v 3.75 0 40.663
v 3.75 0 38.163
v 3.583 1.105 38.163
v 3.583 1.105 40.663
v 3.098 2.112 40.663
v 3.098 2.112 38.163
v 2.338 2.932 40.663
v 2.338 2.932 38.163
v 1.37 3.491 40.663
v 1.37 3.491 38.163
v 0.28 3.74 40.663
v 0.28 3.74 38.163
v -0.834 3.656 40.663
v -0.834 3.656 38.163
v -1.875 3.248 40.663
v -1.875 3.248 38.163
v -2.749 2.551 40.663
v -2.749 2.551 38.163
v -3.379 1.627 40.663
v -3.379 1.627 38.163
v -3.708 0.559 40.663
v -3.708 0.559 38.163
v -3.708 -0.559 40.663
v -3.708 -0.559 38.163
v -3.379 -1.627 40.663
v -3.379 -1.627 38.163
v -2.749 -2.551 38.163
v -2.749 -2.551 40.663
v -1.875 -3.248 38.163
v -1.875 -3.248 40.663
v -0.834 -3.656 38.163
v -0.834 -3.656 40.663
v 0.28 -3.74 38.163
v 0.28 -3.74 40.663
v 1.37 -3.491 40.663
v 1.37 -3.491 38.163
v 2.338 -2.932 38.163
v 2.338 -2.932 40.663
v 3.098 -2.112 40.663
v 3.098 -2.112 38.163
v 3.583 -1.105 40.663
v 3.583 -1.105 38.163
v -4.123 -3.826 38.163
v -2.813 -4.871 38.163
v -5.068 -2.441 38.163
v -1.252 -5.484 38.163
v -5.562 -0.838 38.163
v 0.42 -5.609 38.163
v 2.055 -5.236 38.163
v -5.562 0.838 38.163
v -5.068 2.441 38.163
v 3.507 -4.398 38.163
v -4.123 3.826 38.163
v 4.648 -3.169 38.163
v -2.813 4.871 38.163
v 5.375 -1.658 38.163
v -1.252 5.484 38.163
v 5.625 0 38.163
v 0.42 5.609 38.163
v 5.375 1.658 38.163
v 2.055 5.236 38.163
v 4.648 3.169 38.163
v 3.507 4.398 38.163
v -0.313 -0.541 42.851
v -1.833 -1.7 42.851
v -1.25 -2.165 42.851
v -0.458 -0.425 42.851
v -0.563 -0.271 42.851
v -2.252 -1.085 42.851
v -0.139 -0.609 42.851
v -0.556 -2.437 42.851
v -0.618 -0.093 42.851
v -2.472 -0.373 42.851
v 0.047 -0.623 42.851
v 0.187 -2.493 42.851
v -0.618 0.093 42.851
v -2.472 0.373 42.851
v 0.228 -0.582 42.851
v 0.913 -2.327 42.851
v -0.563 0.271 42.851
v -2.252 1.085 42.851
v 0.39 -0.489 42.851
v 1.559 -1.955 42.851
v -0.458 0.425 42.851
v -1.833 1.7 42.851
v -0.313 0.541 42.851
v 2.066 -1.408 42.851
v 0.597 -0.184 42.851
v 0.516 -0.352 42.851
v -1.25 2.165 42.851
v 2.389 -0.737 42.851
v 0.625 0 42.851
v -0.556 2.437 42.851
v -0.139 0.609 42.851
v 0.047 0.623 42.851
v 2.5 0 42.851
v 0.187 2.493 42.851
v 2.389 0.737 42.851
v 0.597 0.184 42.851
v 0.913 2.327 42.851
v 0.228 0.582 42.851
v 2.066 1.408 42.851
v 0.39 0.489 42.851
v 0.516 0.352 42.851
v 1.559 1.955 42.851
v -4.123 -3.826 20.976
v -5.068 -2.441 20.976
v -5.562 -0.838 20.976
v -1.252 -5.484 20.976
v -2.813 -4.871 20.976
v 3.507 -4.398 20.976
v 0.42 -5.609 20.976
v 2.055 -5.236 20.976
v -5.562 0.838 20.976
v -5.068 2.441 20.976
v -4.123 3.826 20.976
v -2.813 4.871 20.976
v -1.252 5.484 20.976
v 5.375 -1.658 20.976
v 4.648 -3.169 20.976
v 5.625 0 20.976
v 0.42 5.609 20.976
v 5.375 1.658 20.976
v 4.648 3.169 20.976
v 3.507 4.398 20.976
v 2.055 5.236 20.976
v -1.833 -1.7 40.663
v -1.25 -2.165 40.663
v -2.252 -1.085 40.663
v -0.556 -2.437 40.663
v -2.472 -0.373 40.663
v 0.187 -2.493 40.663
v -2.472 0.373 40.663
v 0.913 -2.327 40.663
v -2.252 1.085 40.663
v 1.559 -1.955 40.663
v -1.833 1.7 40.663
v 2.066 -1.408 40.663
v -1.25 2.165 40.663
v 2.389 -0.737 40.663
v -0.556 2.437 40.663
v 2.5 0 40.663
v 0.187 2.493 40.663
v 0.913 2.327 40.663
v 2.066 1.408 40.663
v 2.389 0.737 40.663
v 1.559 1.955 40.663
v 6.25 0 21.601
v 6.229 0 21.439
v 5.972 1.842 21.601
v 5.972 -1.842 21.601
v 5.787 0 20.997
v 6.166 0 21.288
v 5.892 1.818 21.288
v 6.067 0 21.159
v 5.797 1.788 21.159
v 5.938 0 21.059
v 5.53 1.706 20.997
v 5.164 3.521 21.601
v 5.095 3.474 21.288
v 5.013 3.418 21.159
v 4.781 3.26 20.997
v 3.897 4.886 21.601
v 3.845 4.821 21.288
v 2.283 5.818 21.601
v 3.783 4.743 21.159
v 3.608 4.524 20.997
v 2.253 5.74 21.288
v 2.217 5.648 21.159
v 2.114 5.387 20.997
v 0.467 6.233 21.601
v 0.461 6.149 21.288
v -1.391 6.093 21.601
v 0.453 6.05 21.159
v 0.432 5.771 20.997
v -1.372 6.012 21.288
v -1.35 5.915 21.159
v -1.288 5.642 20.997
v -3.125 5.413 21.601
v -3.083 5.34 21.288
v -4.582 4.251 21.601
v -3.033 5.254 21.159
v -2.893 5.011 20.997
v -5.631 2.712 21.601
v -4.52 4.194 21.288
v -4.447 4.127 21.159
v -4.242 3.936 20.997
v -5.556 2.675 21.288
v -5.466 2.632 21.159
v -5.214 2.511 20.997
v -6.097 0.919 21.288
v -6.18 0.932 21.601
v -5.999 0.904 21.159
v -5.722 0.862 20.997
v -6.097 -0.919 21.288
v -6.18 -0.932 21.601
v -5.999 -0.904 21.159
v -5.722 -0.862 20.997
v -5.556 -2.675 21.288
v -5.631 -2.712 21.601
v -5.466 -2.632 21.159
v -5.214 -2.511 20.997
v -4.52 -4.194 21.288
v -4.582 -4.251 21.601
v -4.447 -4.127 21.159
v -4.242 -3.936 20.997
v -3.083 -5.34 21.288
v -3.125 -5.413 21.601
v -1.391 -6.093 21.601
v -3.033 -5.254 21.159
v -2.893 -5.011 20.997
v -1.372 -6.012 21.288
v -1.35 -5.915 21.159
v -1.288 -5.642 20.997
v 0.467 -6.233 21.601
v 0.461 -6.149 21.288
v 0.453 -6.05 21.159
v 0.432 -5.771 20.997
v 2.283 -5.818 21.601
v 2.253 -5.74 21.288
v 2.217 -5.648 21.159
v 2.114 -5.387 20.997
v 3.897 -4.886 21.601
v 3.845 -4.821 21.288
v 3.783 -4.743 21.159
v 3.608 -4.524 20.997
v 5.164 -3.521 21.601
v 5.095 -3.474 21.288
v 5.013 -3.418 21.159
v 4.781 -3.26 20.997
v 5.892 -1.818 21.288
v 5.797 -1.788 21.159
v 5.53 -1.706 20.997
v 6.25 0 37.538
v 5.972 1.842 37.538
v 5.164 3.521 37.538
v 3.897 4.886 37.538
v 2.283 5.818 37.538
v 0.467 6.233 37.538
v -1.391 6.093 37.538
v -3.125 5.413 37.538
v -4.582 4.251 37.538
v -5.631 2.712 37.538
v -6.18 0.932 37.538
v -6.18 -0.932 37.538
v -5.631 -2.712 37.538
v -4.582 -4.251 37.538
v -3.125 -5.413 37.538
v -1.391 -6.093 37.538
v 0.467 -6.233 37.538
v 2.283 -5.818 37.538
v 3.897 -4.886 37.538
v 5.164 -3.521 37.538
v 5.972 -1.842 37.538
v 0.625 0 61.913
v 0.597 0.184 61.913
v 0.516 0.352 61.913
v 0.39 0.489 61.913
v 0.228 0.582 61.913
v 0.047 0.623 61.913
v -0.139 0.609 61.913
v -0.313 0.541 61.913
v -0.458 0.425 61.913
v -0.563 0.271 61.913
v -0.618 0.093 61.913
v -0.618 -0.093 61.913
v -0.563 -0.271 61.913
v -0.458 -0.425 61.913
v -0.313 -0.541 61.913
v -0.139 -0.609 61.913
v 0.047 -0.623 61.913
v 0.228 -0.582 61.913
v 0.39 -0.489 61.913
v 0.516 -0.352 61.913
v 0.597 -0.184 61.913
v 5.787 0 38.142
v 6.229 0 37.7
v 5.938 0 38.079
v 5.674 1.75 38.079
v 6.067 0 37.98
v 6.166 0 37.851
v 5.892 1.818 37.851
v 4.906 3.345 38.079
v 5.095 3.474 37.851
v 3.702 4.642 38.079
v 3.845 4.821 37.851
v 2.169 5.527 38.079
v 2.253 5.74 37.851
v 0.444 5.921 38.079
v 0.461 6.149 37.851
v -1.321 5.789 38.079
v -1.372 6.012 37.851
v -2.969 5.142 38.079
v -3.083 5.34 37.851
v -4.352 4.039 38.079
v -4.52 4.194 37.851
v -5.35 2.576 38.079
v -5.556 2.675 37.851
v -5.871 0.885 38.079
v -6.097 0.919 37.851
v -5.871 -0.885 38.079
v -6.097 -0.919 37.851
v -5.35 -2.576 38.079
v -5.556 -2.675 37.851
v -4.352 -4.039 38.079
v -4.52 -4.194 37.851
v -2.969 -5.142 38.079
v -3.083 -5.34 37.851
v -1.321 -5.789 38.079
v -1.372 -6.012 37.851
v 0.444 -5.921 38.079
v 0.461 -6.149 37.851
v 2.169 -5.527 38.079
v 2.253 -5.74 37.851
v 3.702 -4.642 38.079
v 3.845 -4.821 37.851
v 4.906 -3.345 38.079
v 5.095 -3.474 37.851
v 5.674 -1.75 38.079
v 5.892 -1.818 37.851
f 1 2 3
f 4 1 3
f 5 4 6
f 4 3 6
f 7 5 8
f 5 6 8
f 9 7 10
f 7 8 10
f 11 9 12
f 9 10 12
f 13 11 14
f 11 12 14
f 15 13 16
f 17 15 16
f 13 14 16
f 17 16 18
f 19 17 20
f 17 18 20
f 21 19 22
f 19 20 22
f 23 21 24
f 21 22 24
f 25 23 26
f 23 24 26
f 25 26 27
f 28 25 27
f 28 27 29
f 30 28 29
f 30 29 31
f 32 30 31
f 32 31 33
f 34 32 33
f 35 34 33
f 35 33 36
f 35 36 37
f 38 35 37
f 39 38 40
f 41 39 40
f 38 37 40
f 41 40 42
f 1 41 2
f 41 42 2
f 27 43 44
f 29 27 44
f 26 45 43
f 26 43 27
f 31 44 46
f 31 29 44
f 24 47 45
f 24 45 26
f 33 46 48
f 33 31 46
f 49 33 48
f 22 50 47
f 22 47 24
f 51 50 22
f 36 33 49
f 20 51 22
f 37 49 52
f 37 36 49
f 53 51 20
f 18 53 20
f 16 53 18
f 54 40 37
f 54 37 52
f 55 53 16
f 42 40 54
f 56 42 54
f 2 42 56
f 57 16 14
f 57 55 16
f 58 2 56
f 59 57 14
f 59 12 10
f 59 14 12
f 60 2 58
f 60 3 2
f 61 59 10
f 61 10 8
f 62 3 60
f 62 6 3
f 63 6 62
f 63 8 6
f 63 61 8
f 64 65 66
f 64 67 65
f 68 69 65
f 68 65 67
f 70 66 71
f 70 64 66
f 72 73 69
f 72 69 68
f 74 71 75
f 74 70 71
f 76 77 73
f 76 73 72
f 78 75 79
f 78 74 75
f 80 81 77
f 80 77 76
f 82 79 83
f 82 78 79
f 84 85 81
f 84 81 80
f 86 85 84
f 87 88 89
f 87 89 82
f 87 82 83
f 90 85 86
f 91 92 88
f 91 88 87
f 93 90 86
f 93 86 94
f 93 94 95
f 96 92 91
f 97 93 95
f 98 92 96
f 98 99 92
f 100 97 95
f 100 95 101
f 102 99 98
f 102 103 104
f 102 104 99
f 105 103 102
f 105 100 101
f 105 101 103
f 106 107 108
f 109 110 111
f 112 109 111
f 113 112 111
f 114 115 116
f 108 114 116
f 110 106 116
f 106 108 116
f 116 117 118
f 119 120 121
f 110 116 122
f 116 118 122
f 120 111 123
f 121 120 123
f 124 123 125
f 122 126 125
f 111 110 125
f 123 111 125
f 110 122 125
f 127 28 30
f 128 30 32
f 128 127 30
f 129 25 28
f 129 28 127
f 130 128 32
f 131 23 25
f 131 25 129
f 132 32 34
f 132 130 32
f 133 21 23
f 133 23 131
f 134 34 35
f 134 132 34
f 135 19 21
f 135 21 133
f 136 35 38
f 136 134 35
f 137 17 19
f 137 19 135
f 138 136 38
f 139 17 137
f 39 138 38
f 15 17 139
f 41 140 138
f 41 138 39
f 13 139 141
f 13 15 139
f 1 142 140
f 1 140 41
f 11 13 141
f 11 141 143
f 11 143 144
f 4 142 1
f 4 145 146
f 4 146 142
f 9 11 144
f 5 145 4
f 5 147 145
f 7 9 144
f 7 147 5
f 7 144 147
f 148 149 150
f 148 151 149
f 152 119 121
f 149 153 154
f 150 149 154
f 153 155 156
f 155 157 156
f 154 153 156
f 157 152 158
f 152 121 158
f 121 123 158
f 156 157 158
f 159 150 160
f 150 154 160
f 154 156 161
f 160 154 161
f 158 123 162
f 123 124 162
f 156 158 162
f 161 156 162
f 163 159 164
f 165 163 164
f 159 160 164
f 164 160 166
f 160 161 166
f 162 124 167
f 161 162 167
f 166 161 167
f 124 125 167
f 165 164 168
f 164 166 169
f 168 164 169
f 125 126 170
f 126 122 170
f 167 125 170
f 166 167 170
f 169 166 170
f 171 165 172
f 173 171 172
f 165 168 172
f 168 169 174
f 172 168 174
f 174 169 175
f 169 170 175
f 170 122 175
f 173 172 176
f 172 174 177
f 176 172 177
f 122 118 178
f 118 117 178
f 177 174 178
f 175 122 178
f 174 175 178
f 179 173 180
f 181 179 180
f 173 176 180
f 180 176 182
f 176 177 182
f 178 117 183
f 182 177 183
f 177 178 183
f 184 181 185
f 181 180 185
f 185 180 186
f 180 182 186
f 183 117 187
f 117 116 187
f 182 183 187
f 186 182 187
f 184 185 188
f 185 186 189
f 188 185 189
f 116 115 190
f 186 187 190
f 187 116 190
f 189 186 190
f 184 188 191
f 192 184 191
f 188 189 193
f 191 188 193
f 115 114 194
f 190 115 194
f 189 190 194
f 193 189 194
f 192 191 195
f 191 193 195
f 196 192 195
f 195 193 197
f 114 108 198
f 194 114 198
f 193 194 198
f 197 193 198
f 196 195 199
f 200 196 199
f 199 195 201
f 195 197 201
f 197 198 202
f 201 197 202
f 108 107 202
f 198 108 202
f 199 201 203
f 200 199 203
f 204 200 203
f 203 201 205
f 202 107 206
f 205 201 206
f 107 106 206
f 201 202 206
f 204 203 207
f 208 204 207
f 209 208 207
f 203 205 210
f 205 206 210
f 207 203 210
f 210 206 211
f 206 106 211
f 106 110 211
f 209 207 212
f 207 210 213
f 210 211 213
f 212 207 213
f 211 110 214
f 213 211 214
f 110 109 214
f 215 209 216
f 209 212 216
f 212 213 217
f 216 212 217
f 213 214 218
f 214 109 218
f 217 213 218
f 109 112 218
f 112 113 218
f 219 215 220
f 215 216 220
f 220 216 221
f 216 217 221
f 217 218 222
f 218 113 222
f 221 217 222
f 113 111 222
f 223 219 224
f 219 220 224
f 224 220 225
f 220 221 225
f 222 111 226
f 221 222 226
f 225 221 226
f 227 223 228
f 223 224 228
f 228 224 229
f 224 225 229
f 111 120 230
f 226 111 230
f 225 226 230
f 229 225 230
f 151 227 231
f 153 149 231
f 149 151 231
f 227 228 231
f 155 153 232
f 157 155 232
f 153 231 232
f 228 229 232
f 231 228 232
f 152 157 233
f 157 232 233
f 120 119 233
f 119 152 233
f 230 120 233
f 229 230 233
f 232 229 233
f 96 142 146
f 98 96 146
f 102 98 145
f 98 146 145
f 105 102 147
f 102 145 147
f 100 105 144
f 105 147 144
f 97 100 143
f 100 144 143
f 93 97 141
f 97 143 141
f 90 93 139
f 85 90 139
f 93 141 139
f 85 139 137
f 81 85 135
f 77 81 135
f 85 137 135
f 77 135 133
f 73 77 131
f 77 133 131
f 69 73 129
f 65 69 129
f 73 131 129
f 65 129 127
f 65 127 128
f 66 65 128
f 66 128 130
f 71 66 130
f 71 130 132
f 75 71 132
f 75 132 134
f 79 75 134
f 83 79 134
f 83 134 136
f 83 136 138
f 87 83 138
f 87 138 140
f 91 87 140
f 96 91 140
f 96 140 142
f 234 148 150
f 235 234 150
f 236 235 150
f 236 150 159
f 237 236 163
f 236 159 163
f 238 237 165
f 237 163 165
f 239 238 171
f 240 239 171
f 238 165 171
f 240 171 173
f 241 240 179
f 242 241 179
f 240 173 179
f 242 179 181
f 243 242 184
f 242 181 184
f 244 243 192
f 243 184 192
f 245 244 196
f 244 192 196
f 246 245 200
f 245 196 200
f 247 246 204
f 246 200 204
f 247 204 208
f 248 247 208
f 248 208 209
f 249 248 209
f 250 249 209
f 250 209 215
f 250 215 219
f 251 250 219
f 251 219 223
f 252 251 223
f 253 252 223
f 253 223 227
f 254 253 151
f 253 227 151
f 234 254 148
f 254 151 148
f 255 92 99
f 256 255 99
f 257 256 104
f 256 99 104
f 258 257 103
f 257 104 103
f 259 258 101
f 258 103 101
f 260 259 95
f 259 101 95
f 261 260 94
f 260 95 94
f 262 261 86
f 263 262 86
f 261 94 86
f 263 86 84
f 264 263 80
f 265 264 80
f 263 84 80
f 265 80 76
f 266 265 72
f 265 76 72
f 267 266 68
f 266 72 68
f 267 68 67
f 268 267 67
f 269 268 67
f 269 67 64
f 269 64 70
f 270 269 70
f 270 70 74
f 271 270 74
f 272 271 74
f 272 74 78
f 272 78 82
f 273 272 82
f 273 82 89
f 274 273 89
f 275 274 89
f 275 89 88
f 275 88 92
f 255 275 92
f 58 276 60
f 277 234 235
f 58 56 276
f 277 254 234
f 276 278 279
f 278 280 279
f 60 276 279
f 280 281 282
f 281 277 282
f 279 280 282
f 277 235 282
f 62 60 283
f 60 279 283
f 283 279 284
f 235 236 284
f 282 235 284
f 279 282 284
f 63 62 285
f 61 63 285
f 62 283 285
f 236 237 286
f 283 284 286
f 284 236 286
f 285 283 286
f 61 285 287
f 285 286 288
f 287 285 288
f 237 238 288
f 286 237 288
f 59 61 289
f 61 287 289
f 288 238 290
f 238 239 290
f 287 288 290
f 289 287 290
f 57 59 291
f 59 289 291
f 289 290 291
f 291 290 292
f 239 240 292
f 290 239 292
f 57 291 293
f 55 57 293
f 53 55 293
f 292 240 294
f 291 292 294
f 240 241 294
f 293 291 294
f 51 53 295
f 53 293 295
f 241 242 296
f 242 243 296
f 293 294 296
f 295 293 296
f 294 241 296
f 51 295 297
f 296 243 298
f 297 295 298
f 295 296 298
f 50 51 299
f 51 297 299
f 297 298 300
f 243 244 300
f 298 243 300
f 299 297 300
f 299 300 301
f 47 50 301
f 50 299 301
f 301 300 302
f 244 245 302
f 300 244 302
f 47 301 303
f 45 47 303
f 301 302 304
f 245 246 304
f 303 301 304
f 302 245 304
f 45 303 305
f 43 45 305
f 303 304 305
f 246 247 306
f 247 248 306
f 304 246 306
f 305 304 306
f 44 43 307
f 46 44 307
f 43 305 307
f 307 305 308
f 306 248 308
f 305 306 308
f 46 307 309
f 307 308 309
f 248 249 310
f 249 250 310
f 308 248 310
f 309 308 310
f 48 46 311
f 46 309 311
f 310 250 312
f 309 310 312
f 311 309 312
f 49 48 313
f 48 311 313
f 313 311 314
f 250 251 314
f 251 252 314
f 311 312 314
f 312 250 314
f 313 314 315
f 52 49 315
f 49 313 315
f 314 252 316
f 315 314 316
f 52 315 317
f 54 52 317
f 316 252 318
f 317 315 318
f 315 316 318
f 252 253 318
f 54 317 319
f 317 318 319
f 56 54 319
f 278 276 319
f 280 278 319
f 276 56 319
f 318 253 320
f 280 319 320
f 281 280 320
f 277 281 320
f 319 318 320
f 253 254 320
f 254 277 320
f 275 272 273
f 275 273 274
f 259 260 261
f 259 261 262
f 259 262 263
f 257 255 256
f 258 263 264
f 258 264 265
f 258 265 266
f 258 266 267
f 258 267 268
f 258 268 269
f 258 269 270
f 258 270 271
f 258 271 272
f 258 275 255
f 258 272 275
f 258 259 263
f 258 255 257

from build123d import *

# Parameters (mm, degrees)
SKETCH1_R           = 20
SKETCH1_R_2         = 2
BOSS_EXTRUDE1_DEPTH = 55
SKETCH1_3_R         = 2
BOSS_EXTRUDE2_DEPTH = 131
SKETCH2_R           = 8
BOSS_EXTRUDE3_DEPTH = 15
SKETCH3_R           = 12
BOSS_EXTRUDE4_DEPTH = 8
FILLET1_R           = 2
SCALE1_SCALE        = 0.5
SCALE2_SCALE        = 0.5
SCALE3_SCALE        = 1.25


with BuildPart() as part:
    # Sketch1 → Boss-Extrude1 (new body)
    with BuildSketch(Plane.XY):
        Circle(SKETCH1_R)
        Circle(SKETCH1_R_2, mode=Mode.SUBTRACT)
    extrude(amount=BOSS_EXTRUDE1_DEPTH)

    # Sketch1<3> → Boss-Extrude2 (add)
    with BuildSketch(Plane.XY):
        Circle(SKETCH1_3_R)
    extrude(amount=BOSS_EXTRUDE2_DEPTH)

    # Sketch2 → Boss-Extrude3 (add)
    with BuildSketch(Plane.XY.offset(55)):
        Circle(SKETCH2_R)
    extrude(amount=BOSS_EXTRUDE3_DEPTH)

    # Sketch3 → Boss-Extrude4 (add)
    with BuildSketch(Plane.XY.offset(55)):
        Circle(SKETCH3_R)
    extrude(amount=BOSS_EXTRUDE4_DEPTH)

    # Fillet1
    fillet1_edges = [part.edges().sort_by_distance(p)[0] for p in [
        (-20, 0, 55),
        (-20, 0, 0),
    ]]
    fillet(fillet1_edges, radius=FILLET1_R)


with BuildPart() as part_1:
    # Scale1: scaled about (0, 0, 30.5101534)
    add(part.part.scale(SCALE1_SCALE).moved(Location((0, 0, 15.2550767))))


with BuildPart() as part_2:
    # Scale2: scaled about (0, 0, 30.5101534)
    add(part_1.part.scale(SCALE2_SCALE).moved(Location((0, 0, 15.2550767))))


with BuildPart() as part_3:
    # Scale3: scaled about (0, 0, 30.5101534)
    add(part_2.part.scale(SCALE3_SCALE).moved(Location((0, 0, -7.62753835))))


solid = part_3.part
